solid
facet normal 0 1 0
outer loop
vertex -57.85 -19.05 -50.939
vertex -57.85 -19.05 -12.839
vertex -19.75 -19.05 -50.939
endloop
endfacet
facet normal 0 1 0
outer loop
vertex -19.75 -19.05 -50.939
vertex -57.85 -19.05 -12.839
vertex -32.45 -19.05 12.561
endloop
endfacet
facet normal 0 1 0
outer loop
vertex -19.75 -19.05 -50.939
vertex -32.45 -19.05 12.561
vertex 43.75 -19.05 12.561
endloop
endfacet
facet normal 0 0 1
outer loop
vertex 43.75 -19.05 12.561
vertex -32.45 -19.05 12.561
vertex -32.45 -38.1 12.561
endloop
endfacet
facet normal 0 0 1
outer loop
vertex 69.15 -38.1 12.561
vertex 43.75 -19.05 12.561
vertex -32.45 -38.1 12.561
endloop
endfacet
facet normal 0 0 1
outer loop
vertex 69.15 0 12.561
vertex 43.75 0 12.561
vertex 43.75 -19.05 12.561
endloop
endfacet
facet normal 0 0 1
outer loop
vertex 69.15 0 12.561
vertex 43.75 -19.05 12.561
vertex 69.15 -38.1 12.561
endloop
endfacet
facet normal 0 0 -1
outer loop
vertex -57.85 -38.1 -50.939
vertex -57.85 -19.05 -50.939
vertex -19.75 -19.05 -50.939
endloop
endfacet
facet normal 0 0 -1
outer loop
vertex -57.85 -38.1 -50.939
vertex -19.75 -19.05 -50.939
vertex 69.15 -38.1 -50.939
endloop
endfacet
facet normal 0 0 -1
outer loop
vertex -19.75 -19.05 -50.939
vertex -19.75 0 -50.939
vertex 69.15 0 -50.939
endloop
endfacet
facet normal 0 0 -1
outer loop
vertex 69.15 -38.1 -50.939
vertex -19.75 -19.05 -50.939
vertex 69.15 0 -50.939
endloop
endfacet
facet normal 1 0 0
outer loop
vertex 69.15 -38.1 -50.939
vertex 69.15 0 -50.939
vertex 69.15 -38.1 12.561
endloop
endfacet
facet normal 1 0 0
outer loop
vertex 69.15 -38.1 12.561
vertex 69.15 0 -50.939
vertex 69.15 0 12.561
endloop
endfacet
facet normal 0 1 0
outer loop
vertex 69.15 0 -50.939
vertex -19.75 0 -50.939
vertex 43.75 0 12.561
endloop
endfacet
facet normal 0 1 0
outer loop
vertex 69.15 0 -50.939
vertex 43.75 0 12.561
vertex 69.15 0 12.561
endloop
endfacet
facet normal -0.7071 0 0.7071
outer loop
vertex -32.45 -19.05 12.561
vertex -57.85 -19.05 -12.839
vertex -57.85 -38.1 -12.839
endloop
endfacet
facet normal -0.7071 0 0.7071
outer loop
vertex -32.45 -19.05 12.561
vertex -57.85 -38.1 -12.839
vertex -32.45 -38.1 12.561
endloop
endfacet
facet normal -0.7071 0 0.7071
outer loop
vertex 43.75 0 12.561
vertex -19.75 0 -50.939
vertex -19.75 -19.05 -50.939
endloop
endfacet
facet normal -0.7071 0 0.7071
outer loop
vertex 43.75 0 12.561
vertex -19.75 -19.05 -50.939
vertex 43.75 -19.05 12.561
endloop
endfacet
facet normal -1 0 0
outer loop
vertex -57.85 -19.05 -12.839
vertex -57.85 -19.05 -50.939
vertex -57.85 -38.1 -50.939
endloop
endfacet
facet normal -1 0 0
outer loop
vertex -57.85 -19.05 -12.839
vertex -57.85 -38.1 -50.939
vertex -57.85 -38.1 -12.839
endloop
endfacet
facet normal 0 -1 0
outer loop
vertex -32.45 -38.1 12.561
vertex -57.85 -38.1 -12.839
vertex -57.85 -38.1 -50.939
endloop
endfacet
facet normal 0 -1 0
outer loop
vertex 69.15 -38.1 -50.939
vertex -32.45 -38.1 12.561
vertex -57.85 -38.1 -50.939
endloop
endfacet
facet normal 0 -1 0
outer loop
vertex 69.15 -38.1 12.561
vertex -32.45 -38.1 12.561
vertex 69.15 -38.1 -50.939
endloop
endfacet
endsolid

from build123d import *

# Parameters (mm, degrees)
F0_W     = 127
F0_H     = 63.5
F1_DEPTH = 38.1
F3_DEPTH = 50.8
F5_DEPTH = 19.05


with BuildPart() as f1:
    # F0 (on Front) → F1 (new body)
    with BuildSketch(Plane.XZ):
        with Locations((5.649563, -19.189008)):
            Rectangle(F0_W, F0_H)
    extrude(amount=F1_DEPTH)

    # F2 (on Front) → F3 (cut)
    with BuildSketch(Plane.XZ):
        Polygon((-57.850437, -12.839008), (-32.450437, 12.560992), (-61.992485, 12.560992), (-61.992485, -12.82603), align=None)
    extrude(amount=F3_DEPTH, mode=Mode.SUBTRACT)

    # F4 (on Front) → F5 (cut)
    with BuildSketch(Plane.XZ):
        Polygon((-19.750437, -50.939008), (43.749563, 12.560992), (-59.24404, 12.560992), (-59.24404, -50.99874), align=None)
    extrude(amount=F5_DEPTH, mode=Mode.SUBTRACT)


solid = f1.part
